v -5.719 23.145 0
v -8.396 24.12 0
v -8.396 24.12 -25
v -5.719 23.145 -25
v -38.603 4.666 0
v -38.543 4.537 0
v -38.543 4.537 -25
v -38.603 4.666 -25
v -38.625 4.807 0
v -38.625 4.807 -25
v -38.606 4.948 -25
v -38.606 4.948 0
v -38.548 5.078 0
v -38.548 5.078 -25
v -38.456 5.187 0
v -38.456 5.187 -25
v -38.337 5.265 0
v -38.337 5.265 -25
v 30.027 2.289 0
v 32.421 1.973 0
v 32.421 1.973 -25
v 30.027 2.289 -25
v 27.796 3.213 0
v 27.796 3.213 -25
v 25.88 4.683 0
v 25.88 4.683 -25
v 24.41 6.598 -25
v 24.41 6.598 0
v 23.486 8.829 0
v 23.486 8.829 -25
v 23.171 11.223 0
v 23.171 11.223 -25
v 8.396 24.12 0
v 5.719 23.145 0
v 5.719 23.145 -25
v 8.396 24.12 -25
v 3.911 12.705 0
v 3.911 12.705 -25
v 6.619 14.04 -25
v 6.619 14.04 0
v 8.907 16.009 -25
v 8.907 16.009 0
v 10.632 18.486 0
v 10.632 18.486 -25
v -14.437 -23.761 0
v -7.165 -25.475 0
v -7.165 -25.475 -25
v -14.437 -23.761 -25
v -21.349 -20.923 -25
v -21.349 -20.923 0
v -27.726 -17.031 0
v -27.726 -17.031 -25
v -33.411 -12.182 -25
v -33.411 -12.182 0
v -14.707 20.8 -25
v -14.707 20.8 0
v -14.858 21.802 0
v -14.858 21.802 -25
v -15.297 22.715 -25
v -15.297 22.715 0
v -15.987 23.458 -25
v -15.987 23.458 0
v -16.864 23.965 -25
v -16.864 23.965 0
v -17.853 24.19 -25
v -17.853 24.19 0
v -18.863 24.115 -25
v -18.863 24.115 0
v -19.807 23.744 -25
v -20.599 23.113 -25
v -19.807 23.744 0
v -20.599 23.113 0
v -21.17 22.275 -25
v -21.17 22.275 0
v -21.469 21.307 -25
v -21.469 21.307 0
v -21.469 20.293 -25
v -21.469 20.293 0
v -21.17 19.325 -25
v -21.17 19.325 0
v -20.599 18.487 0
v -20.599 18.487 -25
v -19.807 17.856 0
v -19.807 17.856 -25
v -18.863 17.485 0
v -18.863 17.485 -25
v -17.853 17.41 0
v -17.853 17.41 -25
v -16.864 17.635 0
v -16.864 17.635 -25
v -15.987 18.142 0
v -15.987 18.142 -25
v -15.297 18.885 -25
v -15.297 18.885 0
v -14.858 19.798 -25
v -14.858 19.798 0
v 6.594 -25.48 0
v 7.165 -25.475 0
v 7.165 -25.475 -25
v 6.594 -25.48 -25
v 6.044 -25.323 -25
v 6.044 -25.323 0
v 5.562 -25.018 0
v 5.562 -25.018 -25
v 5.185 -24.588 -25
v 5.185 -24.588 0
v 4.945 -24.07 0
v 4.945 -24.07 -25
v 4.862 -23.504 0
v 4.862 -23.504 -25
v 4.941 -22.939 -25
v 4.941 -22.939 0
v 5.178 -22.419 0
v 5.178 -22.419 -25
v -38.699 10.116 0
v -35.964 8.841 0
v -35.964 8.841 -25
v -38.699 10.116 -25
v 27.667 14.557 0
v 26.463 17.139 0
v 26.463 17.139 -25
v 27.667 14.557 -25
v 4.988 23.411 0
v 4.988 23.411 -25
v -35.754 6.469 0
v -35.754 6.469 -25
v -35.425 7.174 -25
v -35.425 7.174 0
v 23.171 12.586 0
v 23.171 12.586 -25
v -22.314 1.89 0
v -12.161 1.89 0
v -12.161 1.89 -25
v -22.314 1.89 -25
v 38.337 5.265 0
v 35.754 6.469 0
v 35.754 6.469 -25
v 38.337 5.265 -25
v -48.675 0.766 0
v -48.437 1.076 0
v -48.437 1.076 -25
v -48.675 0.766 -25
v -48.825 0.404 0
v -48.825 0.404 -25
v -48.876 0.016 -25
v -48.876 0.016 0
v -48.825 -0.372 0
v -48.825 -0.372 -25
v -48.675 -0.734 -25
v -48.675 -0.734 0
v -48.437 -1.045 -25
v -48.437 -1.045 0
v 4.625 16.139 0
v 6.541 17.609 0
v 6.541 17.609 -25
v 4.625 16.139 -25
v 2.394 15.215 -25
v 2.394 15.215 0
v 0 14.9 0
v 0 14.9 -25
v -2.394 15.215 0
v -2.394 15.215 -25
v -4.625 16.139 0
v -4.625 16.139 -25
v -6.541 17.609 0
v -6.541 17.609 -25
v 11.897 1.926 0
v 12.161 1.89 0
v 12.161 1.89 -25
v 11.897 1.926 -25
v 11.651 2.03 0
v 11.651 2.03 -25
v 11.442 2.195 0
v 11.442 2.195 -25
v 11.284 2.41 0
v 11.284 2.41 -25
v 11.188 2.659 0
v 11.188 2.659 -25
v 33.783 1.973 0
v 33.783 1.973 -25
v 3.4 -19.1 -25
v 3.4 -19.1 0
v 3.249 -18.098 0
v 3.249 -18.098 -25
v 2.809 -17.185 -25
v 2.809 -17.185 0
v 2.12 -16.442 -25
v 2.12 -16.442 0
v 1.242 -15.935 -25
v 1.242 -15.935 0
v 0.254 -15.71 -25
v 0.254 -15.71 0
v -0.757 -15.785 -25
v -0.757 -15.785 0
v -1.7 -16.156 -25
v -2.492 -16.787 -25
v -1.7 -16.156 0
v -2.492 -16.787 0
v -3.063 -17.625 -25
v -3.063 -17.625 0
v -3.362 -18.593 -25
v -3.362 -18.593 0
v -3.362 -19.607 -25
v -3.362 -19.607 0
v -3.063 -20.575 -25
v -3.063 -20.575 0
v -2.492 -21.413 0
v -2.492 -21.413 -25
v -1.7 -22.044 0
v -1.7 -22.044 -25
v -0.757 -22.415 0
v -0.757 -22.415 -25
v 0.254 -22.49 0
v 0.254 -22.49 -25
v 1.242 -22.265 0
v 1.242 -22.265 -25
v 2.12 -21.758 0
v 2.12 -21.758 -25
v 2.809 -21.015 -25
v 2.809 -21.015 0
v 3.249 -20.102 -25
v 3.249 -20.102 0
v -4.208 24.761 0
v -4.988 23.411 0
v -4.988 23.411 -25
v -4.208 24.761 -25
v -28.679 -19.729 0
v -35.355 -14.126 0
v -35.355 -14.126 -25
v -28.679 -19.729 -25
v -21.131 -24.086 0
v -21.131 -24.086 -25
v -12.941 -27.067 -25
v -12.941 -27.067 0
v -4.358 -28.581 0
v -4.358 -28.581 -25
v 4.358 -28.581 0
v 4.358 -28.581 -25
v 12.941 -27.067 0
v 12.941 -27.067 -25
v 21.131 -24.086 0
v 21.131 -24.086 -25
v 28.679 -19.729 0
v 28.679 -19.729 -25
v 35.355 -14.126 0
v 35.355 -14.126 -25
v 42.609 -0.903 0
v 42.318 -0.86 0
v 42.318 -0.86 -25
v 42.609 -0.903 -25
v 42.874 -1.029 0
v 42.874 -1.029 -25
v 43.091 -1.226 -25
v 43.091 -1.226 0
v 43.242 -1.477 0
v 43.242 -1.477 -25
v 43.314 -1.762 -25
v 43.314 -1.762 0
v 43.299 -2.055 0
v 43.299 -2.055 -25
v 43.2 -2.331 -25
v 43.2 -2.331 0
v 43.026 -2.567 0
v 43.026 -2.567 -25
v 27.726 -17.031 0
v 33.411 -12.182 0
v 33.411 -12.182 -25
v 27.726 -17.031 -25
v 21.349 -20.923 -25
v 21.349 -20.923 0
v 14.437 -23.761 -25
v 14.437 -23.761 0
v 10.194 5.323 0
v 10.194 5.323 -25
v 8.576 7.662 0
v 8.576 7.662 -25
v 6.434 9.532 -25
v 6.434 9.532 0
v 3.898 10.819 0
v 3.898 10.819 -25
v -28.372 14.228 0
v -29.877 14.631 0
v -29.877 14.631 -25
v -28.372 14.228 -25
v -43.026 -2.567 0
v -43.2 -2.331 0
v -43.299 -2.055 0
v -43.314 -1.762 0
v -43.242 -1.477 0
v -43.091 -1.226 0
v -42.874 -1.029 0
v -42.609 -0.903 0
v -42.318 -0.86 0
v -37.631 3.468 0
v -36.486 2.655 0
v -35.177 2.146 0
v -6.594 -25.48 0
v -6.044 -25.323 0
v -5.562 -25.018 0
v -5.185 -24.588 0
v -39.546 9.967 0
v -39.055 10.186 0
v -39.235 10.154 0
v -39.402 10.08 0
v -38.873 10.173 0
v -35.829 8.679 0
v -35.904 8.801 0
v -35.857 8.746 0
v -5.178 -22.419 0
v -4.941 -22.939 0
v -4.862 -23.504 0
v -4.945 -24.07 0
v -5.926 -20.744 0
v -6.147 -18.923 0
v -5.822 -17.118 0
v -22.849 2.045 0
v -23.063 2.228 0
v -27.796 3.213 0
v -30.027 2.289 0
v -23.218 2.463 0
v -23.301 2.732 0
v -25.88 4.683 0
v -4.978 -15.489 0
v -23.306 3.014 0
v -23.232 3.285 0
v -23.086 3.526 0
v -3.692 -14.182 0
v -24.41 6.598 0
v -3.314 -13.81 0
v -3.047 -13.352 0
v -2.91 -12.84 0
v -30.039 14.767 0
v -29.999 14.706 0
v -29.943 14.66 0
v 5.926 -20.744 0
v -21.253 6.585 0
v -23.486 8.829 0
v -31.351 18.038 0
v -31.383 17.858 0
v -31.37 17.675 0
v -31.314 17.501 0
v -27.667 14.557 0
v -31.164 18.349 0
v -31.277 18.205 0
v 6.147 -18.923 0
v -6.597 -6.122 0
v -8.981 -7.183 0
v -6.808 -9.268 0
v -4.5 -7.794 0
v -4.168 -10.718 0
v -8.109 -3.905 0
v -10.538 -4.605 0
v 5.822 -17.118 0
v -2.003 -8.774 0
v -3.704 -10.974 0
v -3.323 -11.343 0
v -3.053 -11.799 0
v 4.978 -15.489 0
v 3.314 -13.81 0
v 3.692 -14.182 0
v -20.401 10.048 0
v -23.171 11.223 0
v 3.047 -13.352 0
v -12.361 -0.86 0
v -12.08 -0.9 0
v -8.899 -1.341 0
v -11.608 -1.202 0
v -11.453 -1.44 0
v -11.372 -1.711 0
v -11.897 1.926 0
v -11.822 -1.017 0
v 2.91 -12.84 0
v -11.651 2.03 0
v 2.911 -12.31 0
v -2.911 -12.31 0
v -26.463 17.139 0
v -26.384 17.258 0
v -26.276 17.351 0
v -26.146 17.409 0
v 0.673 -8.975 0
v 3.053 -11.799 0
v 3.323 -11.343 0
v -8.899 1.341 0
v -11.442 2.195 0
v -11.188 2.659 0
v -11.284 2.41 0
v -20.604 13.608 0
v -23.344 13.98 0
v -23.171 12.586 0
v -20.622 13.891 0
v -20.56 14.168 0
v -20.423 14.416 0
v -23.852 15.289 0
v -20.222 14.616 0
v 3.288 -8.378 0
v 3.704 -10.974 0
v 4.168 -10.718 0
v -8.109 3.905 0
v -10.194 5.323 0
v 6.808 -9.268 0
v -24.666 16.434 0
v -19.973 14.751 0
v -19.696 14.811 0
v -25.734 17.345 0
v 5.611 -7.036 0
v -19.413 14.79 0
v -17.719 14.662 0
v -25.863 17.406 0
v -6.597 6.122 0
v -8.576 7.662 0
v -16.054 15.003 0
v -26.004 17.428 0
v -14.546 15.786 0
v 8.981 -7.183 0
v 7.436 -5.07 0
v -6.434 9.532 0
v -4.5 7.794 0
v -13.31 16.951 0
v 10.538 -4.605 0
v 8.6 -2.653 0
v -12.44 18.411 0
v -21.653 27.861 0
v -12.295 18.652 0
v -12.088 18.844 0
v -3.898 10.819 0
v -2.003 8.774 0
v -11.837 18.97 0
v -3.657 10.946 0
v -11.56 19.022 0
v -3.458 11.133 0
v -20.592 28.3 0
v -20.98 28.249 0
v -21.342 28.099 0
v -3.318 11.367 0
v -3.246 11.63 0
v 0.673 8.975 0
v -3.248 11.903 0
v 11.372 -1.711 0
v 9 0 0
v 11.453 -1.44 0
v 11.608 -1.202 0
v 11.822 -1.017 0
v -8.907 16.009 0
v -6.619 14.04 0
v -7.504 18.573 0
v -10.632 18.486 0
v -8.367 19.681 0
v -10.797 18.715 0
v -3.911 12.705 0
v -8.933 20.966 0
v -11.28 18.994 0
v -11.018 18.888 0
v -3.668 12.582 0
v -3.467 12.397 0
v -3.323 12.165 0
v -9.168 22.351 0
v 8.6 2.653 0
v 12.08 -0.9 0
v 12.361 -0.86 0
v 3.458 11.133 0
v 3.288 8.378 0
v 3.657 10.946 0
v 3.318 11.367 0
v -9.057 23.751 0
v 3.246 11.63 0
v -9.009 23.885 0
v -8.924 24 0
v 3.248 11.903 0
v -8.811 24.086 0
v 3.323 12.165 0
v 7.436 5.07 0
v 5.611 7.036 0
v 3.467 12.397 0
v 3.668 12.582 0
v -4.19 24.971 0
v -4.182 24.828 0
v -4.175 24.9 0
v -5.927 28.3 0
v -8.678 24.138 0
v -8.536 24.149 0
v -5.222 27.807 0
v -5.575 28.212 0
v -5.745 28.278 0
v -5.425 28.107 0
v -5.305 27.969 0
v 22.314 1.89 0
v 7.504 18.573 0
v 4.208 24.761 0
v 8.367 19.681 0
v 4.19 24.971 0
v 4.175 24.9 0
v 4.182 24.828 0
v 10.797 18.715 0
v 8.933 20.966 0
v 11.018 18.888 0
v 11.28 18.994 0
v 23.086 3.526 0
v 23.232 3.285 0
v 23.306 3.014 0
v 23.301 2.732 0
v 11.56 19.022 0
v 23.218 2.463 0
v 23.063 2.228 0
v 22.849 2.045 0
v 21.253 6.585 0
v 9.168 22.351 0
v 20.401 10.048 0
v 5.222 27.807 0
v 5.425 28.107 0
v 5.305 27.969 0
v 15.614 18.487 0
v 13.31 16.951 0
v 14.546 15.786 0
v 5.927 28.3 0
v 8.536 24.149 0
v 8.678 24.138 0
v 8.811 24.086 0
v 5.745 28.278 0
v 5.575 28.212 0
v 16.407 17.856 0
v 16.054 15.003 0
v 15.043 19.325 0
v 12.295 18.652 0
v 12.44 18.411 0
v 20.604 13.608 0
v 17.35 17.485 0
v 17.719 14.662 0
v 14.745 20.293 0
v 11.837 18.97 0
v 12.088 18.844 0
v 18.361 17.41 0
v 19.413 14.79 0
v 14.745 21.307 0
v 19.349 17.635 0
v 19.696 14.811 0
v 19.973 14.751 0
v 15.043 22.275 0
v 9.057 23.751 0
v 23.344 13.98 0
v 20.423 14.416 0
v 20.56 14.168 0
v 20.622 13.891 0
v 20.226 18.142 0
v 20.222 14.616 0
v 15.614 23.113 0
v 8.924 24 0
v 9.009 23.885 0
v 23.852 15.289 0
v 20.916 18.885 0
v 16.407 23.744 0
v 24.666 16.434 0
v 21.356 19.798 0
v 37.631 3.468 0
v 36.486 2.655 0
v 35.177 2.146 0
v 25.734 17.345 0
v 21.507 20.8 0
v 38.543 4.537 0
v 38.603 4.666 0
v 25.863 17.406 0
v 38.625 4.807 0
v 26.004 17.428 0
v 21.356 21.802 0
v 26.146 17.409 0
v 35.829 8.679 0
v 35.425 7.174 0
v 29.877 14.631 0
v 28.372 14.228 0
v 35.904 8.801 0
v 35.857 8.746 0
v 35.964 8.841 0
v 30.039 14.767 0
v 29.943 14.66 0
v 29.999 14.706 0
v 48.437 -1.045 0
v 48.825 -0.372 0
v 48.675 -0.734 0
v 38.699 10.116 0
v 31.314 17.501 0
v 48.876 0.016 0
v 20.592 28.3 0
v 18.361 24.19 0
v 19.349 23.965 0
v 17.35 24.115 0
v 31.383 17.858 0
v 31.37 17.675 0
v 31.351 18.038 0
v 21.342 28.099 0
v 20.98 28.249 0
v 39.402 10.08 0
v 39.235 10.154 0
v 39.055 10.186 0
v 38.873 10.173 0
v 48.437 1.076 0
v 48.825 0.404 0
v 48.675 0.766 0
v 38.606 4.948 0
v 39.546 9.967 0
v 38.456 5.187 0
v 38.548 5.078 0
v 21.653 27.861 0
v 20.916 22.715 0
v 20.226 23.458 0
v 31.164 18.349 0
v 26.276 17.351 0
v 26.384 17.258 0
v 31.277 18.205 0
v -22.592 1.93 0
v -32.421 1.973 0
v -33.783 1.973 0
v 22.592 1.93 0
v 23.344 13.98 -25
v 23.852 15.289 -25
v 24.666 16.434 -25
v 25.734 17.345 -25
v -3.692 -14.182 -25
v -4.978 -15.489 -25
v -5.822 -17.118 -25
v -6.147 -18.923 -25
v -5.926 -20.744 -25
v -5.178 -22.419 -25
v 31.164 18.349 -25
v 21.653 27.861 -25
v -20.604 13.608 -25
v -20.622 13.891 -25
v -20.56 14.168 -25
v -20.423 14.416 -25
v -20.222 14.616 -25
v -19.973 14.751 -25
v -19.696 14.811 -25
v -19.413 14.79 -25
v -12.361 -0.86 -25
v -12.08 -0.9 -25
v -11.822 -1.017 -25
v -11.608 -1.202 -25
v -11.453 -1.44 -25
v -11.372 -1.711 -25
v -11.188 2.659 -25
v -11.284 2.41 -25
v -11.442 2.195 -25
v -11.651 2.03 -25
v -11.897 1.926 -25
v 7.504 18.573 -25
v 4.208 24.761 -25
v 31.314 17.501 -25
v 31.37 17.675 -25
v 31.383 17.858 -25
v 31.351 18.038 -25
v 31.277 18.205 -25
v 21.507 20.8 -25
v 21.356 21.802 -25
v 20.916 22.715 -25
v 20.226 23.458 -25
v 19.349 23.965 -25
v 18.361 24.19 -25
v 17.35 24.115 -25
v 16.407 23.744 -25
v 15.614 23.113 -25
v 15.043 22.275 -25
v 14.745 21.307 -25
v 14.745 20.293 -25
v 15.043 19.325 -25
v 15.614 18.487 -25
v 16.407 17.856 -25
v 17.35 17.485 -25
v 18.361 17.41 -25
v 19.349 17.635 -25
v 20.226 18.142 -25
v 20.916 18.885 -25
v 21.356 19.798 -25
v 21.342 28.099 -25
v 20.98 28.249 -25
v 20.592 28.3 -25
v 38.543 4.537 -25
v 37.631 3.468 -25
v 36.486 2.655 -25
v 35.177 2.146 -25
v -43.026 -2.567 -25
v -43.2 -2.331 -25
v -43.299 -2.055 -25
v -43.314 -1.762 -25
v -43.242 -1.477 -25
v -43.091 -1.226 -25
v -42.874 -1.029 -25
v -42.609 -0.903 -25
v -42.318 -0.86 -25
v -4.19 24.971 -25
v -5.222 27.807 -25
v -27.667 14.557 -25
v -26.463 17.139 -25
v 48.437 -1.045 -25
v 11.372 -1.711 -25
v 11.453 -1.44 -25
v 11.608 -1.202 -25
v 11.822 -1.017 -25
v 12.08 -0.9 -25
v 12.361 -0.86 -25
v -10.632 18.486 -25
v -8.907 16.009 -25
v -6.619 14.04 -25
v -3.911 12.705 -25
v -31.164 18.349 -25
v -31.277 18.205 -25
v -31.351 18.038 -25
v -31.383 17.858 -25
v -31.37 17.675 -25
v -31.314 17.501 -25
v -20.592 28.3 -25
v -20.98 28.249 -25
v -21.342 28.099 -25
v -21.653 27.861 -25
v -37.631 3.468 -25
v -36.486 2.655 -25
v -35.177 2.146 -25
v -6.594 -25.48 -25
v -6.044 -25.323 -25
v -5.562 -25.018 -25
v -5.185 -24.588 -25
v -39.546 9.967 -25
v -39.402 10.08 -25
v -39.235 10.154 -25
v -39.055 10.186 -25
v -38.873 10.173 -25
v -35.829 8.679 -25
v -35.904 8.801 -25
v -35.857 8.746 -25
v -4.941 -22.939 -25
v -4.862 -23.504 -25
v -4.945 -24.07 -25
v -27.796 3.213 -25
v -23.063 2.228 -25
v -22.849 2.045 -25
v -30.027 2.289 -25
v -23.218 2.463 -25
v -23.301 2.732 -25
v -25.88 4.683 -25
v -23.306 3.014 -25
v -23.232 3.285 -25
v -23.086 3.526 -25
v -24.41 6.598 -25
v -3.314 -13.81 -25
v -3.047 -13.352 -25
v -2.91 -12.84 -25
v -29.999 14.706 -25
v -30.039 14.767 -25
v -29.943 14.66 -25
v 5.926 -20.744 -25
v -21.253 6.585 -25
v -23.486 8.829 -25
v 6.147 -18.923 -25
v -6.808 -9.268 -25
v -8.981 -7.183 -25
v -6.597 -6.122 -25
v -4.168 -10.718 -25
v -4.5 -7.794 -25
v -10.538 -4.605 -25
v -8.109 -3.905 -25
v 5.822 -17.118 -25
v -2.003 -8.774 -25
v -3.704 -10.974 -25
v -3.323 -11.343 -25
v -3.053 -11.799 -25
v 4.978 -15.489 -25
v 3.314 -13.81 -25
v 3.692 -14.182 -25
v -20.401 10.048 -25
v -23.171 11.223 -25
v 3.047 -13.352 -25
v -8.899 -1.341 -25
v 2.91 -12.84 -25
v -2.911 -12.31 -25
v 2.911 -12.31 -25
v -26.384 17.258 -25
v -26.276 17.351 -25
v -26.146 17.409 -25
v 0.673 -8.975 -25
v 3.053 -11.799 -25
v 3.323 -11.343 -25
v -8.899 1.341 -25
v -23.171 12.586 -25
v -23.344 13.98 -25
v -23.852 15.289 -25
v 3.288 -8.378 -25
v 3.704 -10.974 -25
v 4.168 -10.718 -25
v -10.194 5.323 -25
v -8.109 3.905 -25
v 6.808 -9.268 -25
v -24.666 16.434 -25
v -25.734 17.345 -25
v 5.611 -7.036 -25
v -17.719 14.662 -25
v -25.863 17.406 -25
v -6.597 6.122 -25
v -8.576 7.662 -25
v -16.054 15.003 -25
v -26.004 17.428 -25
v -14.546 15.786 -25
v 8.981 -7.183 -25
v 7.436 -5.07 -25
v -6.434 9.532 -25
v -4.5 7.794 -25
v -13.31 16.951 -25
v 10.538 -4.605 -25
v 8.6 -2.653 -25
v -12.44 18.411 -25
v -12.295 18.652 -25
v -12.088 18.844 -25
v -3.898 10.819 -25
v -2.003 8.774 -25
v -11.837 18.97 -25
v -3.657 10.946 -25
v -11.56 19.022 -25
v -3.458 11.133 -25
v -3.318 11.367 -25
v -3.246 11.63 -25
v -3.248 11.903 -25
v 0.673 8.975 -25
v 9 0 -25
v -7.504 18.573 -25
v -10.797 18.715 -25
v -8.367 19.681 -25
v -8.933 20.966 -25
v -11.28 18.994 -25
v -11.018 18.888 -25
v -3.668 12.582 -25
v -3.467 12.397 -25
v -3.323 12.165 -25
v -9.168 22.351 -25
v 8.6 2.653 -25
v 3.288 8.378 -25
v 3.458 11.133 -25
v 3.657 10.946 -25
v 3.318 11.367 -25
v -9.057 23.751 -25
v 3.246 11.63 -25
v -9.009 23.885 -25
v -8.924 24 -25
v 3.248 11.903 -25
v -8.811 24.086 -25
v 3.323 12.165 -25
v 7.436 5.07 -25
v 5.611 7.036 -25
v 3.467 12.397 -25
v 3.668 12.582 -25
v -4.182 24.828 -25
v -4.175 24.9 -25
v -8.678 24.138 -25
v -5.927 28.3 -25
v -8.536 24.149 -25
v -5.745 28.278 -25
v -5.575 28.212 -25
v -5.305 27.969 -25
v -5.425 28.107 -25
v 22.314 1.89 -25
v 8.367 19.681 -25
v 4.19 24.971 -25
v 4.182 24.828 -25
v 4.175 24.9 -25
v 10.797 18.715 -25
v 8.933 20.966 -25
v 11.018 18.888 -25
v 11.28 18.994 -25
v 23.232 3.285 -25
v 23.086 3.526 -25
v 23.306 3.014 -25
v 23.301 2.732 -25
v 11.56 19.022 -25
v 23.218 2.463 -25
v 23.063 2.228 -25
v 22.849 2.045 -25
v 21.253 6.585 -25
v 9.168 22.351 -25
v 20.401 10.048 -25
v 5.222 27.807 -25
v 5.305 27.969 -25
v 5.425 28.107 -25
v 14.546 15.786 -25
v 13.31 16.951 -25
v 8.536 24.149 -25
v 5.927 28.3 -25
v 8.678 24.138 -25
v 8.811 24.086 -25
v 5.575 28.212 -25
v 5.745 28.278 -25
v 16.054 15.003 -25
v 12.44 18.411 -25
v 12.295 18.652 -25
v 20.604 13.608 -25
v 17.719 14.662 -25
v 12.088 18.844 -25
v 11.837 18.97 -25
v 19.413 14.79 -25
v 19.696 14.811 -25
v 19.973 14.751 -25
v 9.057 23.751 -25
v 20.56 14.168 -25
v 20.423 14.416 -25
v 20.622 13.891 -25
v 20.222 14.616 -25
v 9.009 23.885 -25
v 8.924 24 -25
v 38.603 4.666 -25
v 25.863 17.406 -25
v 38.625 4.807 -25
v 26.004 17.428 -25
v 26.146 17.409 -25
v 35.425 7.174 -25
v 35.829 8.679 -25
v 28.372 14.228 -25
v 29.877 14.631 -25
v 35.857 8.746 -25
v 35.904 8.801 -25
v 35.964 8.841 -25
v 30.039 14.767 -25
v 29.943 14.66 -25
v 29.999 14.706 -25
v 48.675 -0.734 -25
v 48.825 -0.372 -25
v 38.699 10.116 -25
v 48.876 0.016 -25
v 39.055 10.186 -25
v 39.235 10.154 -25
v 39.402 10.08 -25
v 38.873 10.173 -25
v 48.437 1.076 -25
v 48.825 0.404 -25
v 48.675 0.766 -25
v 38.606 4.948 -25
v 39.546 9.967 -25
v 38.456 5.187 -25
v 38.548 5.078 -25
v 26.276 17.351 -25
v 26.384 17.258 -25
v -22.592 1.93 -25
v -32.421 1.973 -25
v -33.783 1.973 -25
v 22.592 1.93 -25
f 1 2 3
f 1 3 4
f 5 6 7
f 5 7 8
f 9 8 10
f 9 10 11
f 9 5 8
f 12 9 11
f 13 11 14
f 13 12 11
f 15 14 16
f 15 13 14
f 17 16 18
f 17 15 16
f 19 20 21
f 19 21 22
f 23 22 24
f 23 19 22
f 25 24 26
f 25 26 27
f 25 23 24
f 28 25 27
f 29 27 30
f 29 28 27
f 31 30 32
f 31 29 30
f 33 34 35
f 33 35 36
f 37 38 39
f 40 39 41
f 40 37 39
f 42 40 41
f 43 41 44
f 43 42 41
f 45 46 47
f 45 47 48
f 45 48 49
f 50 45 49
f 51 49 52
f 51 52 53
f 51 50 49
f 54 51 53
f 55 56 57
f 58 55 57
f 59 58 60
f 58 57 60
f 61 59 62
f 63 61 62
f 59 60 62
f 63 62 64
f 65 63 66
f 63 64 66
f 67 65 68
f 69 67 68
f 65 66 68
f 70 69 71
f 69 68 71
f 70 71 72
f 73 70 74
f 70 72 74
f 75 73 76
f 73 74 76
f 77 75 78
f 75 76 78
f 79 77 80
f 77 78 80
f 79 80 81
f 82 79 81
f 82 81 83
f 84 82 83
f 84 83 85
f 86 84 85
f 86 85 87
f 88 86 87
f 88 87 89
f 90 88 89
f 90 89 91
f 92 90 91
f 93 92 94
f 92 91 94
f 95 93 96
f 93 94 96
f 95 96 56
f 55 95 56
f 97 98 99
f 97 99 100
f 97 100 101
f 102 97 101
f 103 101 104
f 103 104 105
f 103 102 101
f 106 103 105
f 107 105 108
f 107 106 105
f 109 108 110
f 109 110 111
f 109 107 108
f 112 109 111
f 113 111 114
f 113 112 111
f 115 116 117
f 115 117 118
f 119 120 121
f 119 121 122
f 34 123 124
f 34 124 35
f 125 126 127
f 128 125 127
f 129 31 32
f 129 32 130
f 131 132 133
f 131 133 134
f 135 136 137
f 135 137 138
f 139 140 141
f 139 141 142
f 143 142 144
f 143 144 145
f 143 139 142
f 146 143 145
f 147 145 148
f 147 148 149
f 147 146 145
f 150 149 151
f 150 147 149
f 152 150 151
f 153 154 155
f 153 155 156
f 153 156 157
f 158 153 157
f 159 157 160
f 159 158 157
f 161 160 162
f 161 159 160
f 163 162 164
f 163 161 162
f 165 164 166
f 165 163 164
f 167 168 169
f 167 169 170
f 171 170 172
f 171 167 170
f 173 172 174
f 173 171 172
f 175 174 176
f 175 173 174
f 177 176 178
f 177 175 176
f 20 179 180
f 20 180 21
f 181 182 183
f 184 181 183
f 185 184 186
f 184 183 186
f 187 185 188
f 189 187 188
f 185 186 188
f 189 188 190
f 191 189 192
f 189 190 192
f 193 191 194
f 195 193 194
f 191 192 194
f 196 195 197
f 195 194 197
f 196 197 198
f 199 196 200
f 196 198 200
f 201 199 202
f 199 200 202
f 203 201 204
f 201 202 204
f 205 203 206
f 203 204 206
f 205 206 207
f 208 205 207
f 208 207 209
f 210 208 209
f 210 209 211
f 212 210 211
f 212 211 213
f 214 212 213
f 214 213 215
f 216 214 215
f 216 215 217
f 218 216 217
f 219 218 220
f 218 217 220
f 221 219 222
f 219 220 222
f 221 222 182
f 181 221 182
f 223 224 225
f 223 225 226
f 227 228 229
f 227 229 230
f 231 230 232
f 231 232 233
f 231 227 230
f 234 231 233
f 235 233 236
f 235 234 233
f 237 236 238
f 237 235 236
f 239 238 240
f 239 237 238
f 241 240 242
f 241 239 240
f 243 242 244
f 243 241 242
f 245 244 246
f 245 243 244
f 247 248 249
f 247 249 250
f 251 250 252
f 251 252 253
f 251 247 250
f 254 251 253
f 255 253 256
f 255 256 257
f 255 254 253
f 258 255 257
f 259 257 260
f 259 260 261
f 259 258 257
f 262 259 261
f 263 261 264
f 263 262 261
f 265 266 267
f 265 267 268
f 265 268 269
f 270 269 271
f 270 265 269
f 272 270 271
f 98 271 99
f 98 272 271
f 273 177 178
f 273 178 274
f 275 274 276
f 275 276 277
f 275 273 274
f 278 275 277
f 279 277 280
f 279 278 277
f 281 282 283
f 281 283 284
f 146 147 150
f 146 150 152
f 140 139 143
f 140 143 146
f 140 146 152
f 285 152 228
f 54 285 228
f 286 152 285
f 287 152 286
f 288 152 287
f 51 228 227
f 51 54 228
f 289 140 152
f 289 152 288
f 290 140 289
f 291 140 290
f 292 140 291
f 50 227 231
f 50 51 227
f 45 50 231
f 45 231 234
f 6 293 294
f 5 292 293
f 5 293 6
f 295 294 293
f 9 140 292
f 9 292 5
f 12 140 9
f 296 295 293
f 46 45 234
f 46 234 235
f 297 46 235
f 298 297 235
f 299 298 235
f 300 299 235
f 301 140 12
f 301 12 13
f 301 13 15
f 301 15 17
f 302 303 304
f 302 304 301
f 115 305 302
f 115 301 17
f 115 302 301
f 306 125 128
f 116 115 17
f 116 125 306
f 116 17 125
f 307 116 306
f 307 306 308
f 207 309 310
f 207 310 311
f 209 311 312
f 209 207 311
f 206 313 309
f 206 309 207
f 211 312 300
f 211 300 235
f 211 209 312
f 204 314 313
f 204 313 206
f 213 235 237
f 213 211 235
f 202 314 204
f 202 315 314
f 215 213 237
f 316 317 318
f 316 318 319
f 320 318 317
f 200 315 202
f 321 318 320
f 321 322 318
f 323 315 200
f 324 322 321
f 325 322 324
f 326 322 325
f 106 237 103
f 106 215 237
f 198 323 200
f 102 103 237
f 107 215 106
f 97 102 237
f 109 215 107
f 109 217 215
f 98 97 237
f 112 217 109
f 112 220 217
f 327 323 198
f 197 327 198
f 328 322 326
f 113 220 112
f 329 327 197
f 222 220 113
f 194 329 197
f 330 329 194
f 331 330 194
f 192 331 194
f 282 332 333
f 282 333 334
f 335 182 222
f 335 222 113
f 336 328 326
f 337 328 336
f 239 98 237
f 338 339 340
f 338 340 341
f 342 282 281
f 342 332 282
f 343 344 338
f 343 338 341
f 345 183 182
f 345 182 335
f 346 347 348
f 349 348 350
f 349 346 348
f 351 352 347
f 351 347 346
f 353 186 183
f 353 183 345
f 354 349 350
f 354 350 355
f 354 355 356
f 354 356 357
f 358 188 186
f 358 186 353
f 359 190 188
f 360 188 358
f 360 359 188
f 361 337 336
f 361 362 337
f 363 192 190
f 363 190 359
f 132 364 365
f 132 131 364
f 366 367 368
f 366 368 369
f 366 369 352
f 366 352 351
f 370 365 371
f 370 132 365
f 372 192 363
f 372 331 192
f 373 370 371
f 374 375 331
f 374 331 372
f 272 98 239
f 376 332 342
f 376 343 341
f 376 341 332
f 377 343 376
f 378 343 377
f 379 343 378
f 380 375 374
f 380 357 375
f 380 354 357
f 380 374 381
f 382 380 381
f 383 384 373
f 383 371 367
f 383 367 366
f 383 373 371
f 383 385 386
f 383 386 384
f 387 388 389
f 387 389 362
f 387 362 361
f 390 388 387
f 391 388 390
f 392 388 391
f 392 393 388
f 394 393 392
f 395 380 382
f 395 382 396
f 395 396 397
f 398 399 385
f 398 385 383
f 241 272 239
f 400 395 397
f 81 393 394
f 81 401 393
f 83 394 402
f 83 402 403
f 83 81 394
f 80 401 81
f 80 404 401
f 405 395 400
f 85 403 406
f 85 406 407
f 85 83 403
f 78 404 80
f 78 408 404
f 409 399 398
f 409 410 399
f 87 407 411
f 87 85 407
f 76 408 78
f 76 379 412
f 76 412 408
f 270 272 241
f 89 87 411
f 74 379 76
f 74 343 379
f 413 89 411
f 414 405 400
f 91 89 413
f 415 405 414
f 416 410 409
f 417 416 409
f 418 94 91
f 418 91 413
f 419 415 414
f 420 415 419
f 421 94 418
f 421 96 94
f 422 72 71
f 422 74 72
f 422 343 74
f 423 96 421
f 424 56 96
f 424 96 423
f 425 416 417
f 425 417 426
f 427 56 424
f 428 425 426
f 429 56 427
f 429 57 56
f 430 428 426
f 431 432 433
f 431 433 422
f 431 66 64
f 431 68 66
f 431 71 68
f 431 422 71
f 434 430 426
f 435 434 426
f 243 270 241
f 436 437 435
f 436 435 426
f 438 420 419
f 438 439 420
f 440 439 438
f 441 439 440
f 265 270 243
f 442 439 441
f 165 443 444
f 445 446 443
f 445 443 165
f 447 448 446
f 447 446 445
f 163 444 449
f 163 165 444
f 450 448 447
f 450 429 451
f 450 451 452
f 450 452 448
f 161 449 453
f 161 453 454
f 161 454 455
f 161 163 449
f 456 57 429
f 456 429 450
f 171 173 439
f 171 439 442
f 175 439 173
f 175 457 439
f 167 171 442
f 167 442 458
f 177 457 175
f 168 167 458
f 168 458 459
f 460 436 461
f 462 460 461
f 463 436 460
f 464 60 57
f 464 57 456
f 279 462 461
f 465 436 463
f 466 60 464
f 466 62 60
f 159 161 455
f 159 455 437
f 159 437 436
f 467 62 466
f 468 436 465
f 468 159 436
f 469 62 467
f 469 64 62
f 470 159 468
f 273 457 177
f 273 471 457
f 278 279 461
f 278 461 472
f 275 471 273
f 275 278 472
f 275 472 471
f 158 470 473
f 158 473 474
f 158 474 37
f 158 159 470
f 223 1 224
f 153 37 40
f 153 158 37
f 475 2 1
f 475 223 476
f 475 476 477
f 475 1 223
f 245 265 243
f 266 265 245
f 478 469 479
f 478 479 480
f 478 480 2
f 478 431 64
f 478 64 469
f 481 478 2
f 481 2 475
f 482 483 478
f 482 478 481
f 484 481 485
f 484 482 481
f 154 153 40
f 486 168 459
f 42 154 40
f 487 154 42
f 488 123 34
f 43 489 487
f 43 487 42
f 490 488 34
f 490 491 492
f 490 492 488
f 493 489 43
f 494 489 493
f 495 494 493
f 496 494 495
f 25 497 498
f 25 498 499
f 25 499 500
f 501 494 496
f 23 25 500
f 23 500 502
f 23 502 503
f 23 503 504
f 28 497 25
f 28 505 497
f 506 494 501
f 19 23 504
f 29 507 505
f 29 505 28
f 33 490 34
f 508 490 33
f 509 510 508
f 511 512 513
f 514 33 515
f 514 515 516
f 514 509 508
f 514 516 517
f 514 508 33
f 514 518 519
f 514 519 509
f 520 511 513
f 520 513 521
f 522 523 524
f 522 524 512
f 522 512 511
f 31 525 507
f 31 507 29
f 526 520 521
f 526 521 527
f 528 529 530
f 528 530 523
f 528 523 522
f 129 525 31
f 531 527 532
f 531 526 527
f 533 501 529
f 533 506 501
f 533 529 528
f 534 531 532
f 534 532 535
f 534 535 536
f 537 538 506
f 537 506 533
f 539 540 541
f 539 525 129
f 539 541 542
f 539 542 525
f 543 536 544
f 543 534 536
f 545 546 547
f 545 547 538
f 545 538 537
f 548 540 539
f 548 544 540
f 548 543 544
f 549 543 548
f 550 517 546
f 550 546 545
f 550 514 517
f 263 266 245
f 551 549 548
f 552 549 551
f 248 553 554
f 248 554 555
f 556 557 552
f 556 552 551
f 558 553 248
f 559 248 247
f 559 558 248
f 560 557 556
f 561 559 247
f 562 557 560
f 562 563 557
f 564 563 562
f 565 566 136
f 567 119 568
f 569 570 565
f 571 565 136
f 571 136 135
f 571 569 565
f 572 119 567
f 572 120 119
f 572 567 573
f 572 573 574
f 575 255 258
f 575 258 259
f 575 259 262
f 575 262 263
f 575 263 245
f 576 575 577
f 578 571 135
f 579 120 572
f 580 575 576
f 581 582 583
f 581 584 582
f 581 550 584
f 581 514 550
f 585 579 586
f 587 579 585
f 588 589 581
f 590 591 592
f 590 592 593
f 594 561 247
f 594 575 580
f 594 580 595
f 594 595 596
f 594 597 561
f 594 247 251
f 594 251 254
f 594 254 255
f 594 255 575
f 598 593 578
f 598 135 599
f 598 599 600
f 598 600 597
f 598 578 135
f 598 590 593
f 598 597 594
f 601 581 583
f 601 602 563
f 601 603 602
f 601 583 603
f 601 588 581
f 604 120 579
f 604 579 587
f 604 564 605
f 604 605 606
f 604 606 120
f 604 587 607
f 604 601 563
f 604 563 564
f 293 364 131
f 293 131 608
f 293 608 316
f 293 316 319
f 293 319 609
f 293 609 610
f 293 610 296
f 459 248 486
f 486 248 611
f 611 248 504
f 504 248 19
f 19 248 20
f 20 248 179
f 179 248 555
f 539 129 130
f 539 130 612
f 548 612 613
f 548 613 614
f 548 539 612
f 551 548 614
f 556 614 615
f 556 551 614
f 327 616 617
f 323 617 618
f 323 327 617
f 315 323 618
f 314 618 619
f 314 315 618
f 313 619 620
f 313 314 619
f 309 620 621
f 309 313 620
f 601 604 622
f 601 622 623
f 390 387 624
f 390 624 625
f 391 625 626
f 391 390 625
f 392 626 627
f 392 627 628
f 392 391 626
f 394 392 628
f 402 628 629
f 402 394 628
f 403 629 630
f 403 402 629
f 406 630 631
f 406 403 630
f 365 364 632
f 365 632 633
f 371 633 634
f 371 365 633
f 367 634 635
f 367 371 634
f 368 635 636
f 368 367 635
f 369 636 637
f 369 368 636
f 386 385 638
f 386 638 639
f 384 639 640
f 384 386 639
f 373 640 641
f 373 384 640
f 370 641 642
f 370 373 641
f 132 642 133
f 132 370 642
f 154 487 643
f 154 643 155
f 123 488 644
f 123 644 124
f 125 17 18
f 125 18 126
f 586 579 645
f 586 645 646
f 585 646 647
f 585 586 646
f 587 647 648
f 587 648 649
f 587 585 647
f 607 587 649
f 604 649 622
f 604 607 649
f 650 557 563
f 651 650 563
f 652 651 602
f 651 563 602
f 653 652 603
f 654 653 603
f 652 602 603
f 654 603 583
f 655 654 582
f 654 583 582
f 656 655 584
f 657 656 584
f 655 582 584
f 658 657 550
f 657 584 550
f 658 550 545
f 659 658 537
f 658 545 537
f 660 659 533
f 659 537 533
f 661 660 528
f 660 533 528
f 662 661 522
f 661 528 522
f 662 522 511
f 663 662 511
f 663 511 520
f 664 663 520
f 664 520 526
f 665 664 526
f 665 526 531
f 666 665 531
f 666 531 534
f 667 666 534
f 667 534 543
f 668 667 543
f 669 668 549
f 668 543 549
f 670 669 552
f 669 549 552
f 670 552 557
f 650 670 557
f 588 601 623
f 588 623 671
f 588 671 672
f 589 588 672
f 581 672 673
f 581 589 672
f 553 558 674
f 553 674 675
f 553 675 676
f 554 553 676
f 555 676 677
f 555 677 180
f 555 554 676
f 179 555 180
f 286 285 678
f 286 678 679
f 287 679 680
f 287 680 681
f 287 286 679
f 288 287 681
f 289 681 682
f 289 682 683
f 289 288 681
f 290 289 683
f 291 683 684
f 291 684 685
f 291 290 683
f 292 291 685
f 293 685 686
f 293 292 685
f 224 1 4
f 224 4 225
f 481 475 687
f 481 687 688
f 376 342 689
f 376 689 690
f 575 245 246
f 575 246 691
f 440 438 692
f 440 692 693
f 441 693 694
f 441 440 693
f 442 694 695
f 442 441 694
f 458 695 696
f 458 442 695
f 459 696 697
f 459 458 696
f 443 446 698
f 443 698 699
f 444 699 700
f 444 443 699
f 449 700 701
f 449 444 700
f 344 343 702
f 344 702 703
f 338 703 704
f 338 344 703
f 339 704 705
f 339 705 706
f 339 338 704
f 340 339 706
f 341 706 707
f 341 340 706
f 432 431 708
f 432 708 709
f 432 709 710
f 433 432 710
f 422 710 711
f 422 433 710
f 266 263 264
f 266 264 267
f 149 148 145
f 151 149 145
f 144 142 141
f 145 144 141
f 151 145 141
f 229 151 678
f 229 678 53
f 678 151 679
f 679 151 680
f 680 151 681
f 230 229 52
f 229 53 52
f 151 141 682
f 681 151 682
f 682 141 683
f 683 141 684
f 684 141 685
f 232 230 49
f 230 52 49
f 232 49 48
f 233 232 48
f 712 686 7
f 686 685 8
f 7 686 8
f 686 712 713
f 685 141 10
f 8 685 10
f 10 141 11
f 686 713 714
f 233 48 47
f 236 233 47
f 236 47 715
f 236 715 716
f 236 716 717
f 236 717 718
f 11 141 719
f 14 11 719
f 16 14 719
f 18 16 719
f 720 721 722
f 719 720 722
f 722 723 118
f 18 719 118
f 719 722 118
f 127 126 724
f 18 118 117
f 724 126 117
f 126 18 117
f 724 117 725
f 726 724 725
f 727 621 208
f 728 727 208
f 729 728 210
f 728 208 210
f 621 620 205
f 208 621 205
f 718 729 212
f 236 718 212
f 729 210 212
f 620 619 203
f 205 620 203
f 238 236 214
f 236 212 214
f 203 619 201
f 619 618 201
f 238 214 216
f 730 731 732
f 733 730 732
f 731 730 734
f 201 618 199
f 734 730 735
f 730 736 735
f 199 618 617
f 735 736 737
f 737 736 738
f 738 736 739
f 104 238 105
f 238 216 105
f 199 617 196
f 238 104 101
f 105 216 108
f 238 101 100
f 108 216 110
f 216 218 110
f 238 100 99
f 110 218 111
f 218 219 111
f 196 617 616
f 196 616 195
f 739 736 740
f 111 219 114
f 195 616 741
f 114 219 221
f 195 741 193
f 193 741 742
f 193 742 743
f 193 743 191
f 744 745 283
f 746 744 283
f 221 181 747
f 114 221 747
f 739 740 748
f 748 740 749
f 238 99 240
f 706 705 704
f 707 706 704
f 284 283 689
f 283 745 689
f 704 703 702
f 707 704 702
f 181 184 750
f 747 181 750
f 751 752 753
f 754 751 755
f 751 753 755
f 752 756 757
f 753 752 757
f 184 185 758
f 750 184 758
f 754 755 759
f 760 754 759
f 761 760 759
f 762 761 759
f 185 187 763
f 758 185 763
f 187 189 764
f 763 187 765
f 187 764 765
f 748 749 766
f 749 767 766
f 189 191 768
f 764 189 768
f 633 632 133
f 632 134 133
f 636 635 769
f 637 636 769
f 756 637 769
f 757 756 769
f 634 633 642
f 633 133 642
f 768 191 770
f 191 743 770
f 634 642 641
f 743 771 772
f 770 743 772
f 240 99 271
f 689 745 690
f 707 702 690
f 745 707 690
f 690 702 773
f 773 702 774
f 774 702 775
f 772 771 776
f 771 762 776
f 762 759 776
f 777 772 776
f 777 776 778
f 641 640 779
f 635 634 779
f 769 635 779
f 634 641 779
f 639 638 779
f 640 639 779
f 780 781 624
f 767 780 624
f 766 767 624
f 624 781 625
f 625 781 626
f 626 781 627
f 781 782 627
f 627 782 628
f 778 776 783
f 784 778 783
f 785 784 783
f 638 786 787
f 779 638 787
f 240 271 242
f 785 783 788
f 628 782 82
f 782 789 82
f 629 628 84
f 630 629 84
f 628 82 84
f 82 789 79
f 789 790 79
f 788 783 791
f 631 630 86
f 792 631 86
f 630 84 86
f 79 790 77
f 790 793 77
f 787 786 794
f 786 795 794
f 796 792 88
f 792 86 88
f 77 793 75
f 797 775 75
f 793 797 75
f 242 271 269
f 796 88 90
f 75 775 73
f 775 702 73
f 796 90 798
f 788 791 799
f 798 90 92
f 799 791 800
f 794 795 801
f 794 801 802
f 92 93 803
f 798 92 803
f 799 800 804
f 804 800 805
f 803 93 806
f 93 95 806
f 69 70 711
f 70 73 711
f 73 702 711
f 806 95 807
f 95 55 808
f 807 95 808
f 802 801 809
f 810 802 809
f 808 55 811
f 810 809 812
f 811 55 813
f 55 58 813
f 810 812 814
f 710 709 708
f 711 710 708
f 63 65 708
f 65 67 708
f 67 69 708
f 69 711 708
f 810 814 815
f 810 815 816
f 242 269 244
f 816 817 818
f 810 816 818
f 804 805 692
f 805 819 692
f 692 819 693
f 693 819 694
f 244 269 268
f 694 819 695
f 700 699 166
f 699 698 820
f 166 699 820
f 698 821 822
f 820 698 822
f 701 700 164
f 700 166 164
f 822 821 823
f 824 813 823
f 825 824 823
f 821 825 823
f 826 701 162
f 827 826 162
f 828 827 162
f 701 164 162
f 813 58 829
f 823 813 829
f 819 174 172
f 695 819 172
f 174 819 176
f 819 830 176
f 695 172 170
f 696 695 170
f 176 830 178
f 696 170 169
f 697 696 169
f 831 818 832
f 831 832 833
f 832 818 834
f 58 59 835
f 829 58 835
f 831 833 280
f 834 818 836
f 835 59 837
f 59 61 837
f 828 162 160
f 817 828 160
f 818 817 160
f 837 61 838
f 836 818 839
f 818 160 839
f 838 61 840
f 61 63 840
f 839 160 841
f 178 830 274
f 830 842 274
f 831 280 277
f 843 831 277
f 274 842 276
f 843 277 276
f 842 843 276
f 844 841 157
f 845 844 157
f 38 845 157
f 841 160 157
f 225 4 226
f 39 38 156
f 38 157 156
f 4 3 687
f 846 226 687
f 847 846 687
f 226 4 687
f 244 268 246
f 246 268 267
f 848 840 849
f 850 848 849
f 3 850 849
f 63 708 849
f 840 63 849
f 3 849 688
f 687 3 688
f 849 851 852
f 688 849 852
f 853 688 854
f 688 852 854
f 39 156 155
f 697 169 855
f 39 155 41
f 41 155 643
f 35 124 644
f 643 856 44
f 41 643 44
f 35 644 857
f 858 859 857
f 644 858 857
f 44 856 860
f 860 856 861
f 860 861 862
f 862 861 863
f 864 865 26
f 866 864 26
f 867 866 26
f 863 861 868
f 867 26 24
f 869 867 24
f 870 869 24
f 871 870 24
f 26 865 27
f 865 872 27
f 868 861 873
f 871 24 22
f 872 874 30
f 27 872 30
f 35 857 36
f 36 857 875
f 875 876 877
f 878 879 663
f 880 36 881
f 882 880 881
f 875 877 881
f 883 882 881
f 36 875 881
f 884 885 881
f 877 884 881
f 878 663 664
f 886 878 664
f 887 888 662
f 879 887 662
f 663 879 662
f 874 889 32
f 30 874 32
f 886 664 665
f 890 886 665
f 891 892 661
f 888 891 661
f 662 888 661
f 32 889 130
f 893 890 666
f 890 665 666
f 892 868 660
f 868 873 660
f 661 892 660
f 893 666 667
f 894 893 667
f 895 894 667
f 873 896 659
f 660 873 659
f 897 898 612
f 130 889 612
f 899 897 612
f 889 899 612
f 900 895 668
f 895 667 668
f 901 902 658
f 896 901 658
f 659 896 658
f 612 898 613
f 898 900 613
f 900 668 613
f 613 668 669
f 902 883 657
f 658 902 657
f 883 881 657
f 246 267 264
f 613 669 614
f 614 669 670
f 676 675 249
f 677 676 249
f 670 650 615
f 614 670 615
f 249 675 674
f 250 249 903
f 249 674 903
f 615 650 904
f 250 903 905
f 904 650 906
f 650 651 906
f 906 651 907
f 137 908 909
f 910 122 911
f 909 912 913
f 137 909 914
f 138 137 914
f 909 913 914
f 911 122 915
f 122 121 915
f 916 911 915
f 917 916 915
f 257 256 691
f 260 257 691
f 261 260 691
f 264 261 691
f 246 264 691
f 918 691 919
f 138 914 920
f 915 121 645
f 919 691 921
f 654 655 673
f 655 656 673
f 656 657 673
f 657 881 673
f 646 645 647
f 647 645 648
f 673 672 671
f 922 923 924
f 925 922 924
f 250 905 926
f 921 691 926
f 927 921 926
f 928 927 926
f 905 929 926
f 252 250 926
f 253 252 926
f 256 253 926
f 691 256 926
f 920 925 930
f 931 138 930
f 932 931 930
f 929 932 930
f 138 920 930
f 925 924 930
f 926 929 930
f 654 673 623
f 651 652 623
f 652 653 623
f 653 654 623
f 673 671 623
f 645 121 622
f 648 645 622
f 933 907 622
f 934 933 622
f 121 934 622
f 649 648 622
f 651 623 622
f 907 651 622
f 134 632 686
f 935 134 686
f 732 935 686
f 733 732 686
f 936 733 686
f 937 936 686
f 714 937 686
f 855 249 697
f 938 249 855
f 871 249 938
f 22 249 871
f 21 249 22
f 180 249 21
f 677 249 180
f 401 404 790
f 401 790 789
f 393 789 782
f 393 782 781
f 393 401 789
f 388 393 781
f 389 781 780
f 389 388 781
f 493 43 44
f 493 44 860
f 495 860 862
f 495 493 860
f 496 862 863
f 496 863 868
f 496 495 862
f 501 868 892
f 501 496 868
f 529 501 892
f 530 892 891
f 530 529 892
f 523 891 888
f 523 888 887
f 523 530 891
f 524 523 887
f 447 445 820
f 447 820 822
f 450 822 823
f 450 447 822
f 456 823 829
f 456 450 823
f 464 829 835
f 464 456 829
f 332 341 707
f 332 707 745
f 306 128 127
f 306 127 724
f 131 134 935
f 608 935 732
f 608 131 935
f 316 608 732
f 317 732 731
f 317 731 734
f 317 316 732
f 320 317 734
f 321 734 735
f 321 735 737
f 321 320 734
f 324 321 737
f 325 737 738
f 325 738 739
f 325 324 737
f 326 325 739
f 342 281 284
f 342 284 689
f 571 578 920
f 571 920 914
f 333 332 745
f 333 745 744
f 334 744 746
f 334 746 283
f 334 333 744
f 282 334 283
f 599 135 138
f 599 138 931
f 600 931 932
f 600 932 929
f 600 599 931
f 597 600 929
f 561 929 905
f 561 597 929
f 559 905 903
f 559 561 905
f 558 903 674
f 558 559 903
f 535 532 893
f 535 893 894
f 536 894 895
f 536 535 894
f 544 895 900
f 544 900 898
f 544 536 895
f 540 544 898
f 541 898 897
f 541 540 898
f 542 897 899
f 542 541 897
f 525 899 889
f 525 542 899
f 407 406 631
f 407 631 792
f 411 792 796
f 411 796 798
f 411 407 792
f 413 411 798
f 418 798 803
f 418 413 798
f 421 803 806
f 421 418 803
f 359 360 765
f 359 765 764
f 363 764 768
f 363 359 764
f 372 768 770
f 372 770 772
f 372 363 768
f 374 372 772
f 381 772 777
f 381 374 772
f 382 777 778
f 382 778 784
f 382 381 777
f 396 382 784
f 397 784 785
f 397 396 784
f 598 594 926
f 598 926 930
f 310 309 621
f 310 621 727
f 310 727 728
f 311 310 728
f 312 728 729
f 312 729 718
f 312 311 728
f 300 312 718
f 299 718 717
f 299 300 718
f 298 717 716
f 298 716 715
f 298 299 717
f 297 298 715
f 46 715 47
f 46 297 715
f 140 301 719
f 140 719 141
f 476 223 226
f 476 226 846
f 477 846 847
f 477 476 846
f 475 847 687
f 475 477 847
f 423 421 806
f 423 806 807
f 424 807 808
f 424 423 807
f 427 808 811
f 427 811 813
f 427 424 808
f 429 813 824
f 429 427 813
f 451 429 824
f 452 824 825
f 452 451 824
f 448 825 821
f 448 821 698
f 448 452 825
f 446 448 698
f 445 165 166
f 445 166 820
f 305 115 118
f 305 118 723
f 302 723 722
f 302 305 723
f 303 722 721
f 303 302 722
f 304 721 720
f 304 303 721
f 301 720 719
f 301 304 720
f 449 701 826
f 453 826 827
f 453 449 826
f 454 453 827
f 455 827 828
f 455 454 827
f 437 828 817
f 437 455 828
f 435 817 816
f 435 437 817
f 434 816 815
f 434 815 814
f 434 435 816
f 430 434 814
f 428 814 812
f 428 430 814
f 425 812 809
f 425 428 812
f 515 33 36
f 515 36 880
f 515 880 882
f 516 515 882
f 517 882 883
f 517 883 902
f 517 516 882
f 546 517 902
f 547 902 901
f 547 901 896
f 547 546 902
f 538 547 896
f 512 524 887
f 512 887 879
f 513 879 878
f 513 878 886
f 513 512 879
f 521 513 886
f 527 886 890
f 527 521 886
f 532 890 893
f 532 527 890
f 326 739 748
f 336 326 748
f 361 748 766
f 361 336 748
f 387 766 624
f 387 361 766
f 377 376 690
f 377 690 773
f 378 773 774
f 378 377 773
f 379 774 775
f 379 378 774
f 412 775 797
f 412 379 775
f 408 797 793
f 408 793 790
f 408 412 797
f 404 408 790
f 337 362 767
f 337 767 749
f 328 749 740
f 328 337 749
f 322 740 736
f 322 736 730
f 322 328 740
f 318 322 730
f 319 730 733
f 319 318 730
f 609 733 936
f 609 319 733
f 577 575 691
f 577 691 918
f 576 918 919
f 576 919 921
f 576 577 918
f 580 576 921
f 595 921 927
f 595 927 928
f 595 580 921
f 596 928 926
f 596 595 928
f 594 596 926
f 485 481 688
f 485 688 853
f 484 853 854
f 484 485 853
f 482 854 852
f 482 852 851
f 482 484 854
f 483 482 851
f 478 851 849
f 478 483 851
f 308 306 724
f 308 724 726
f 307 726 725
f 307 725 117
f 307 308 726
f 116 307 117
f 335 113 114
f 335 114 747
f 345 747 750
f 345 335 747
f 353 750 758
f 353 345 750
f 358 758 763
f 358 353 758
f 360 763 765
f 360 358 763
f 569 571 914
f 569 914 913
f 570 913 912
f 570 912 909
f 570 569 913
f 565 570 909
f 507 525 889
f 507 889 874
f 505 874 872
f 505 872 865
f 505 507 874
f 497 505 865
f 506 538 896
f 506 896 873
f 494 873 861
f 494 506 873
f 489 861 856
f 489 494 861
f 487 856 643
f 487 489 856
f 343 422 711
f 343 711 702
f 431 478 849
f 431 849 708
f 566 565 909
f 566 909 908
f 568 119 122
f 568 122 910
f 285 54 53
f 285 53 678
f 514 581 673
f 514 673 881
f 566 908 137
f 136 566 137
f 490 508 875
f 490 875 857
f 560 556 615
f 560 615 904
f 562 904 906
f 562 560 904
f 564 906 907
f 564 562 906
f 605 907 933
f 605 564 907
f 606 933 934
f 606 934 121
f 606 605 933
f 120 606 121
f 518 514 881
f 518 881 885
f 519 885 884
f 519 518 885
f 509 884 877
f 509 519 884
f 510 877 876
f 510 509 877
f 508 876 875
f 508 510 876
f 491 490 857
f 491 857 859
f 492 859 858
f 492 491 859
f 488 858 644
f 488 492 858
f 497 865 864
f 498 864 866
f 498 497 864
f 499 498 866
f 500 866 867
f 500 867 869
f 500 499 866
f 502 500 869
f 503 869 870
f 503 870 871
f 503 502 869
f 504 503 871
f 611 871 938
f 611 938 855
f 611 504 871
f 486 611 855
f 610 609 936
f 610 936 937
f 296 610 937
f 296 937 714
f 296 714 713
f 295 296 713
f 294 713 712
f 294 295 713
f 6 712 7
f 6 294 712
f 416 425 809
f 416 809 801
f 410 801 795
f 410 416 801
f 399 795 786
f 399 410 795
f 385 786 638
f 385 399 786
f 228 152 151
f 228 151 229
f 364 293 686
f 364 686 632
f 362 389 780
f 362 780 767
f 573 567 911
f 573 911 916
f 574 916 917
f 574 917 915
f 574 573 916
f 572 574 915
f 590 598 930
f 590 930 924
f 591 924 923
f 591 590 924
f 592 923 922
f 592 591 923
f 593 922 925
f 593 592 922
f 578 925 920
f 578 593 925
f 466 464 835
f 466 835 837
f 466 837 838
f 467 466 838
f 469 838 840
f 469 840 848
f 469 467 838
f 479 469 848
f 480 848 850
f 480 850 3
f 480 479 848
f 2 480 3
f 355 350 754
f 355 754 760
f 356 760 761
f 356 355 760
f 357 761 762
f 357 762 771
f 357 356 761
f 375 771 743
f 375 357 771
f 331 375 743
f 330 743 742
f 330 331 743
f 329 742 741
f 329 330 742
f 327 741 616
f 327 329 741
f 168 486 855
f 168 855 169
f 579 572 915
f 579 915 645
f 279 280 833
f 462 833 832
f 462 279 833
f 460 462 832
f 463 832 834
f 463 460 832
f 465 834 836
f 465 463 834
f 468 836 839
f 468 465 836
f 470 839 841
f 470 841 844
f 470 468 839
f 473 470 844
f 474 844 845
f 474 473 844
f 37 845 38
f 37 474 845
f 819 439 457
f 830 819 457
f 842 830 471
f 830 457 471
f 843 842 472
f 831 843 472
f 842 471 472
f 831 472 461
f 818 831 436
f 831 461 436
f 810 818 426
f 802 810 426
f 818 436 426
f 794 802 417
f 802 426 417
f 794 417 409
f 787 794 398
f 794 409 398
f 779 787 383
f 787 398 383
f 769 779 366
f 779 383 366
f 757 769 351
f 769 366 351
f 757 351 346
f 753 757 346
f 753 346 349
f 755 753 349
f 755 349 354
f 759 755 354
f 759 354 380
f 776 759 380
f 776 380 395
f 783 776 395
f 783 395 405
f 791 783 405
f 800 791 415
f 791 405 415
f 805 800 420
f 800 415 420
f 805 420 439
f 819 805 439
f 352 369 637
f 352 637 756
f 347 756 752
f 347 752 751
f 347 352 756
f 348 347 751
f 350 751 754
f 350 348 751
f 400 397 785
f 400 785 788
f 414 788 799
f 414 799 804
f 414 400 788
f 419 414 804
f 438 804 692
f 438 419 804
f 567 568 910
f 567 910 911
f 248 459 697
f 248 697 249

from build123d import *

# Parameters (mm, degrees)
SK_MAIN_EXTRUSION_R   = 3.4
SK_MAIN_EXTRUSION_R_2 = 9
MAIN_EXTRUSION_DEPTH  = 25


with BuildPart() as part:
    # Sk Main Extrusion → Main Extrusion (new body)
    with BuildSketch(Plane.XY):
        with BuildLine():
            Line((-35.964339765, 8.84120158), (-38.698942589, 10.116367819))
            ThreePointArc((-38.698942589, 10.116367819), (-39.146142418, 10.175242794), (-39.546236371, 9.966967065))
            Line((-39.546236371, 9.966967065), (-48.436814511, 1.076388924))
            ThreePointArc((-48.436814511, 1.076388924), (-48.876154339, 0.015728753), (-48.436814511, -1.044931419))
            Line((-48.436814511, -1.044931419), (-35.355339059, -14.126406871))
            ThreePointArc((-35.355339059, -14.126406871), (0, -28.771067812), (35.355339059, -14.126406871))
            Line((35.355339059, -14.126406871), (48.436814511, -1.044931419))
            ThreePointArc((48.436814511, -1.044931419), (48.876154339, 0.015728753), (48.436814511, 1.076388924))
            Line((48.436814511, 1.076388924), (39.546236371, 9.966967065))
            ThreePointArc((39.546236371, 9.966967065), (39.146142418, 10.175242794), (38.698942589, 10.116367819))
            Line((38.698942589, 10.116367819), (35.964339765, 8.84120158))
            ThreePointArc((35.964339765, 8.84120158), (35.87848322, 8.775321536), (35.828512874, 8.679329395))
            Line((35.828512874, 8.679329395), (35.425239457, 7.174292513))
            Line((35.425239457, 7.174292513), (35.753978107, 6.469310204))
            Line((35.753978107, 6.469310204), (38.336524222, 5.265049173))
            ThreePointArc((38.336524222, 5.265049173), (38.606308031, 4.948092133), (38.542703923, 4.53675336))
            ThreePointArc((38.542703923, 4.53675336), (36.486225813, 2.654969004), (33.783331243, 1.973371234))
            Line((33.783331243, 1.973371234), (32.420845917, 1.973371234))
            ThreePointArc((32.420845917, 1.973371234), (25.880108191, 4.682633508), (23.170845917, 11.223371234))
            Line((23.170845917, 11.223371234), (23.170845917, 12.585856559))
            ThreePointArc((23.170845917, 12.585856559), (23.852443688, 15.28875113), (25.734228043, 17.34522924))
            ThreePointArc((25.734228043, 17.34522924), (26.145566816, 17.408833348), (26.462523856, 17.139049539))
            Line((26.462523856, 17.139049539), (27.666784887, 14.556503424))
            Line((27.666784887, 14.556503424), (28.371767196, 14.227764774))
            Line((28.371767196, 14.227764774), (29.876804078, 14.631038191))
            ThreePointArc((29.876804078, 14.631038191), (29.972796219, 14.681008536), (30.038676264, 14.766865082))
            Line((30.038676264, 14.766865082), (31.313842502, 17.501467906))
            ThreePointArc((31.313842502, 17.501467906), (31.372717477, 17.948667735), (31.164441748, 18.348761688))
            Line((31.164441748, 18.348761688), (21.652543264, 27.860660172))
            ThreePointArc((21.652543264, 27.860660172), (21.165908241, 28.185819299), (20.591883092, 28.3))
            Line((20.591883092, 28.3), (5.926823816, 28.3))
            ThreePointArc((5.926823816, 28.3), (5.496641489, 28.164364033), (5.222054351, 27.806515107))
            Line((5.222054351, 27.806515107), (4.190076845, 24.971180212))
            ThreePointArc((4.190076845, 24.971180212), (4.175951325, 24.863886241), (4.208493649, 24.760675177))
            Line((4.208493649, 24.760675177), (4.987558066, 23.411296024))
            Line((4.987558066, 23.411296024), (5.718509166, 23.145251581))
            Line((5.718509166, 23.145251581), (8.396186179, 24.11984631))
            ThreePointArc((8.396186179, 24.11984631), (8.811074612, 24.086489799), (9.056960151, 23.750654467))
            ThreePointArc((9.056960151, 23.750654467), (8.933433013, 20.965882372), (7.504160339, 18.572684887))
            Line((7.504160339, 18.572684887), (6.540737726, 17.609262274))
            ThreePointArc((6.540737726, 17.609262274), (0, 14.9), (-6.540737726, 17.609262274))
            Line((-6.540737726, 17.609262274), (-7.504160339, 18.572684887))
            ThreePointArc((-7.504160339, 18.572684887), (-8.933433013, 20.965882372), (-9.056960151, 23.750654467))
            ThreePointArc((-9.056960151, 23.750654467), (-8.811074612, 24.086489799), (-8.396186179, 24.11984631))
            Line((-8.396186179, 24.11984631), (-5.718509166, 23.145251581))
            Line((-5.718509166, 23.145251581), (-4.987558066, 23.411296024))
            Line((-4.987558066, 23.411296024), (-4.208493649, 24.760675177))
            ThreePointArc((-4.208493649, 24.760675177), (-4.175951325, 24.863886241), (-4.190076845, 24.971180212))
            Line((-4.190076845, 24.971180212), (-5.222054351, 27.806515107))
            ThreePointArc((-5.222054351, 27.806515107), (-5.496641489, 28.164364033), (-5.926823816, 28.3))
            Line((-5.926823816, 28.3), (-20.591883092, 28.3))
            ThreePointArc((-20.591883092, 28.3), (-21.165908241, 28.185819299), (-21.652543264, 27.860660172))
            Line((-21.652543264, 27.860660172), (-31.164441748, 18.348761688))
            ThreePointArc((-31.164441748, 18.348761688), (-31.372717477, 17.948667735), (-31.313842502, 17.501467906))
            Line((-31.313842502, 17.501467906), (-30.038676264, 14.766865082))
            ThreePointArc((-30.038676264, 14.766865082), (-29.972796219, 14.681008536), (-29.876804078, 14.631038191))
            Line((-29.876804078, 14.631038191), (-28.371767196, 14.227764774))
            Line((-28.371767196, 14.227764774), (-27.666784887, 14.556503424))
            Line((-27.666784887, 14.556503424), (-26.462523856, 17.139049539))
            ThreePointArc((-26.462523856, 17.139049539), (-26.145566816, 17.408833348), (-25.734228043, 17.34522924))
            ThreePointArc((-25.734228043, 17.34522924), (-23.852443688, 15.28875113), (-23.170845917, 12.585856559))
            Line((-23.170845917, 12.585856559), (-23.170845917, 11.223371234))
            ThreePointArc((-23.170845917, 11.223371234), (-25.880108191, 4.682633508), (-32.420845917, 1.973371234))
            Line((-32.420845917, 1.973371234), (-33.783331243, 1.973371234))
            ThreePointArc((-33.783331243, 1.973371234), (-36.486225813, 2.654969004), (-38.542703923, 4.53675336))
            ThreePointArc((-38.542703923, 4.53675336), (-38.606308031, 4.948092133), (-38.336524222, 5.265049173))
            Line((-38.336524222, 5.265049173), (-35.753978107, 6.469310204))
            Line((-35.753978107, 6.469310204), (-35.425239457, 7.174292513))
            Line((-35.425239457, 7.174292513), (-35.828512874, 8.679329395))
            ThreePointArc((-35.828512874, 8.679329395), (-35.87848322, 8.775321536), (-35.964339765, 8.84120158))
        make_face()
        with Locations((0, -19.1)):
            Circle(SK_MAIN_EXTRUSION_R, mode=Mode.SUBTRACT)
        Circle(SK_MAIN_EXTRUSION_R_2, mode=Mode.SUBTRACT)
        with Locations((18.106601718, 20.8)):
            Circle(SK_MAIN_EXTRUSION_R, mode=Mode.SUBTRACT)
        with Locations((-18.106601718, 20.8)):
            Circle(SK_MAIN_EXTRUSION_R, mode=Mode.SUBTRACT)
        with BuildLine():
            Line((-33.410795411, -12.181863223), (-43.025551853, -2.567106781))
            ThreePointArc((-43.025551853, -2.567106781), (-43.242324604, -1.477316568), (-42.318445072, -0.86))
            Line((-42.318445072, -0.86), (-12.360841395, -0.86))
            ThreePointArc((-12.360841395, -0.86), (-11.708461138, -1.102108187), (-11.371974084, -1.7112))
            ThreePointArc((-11.371974084, -1.7112), (-8.980737669, -7.183059997), (-4.167977698, -10.718113729))
            ThreePointArc((-4.167977698, -10.718113729), (-2.911454942, -12.309920658), (-3.692145622, -14.181609948))
            ThreePointArc((-3.692145622, -14.181609948), (-6.052344462, -18.008383533), (-5.177787873, -22.418585955))
            ThreePointArc((-5.177787873, -22.418585955), (-5.184897798, -24.588029411), (-7.164897408, -25.474673081))
            ThreePointArc((-7.164897408, -25.474673081), (-21.348803489, -20.923067641), (-33.410795411, -12.181863223))
        make_face(mode=Mode.SUBTRACT)
        with BuildLine():
            Line((43.025551853, -2.567106781), (33.410795411, -12.181863223))
            ThreePointArc((33.410795411, -12.181863223), (21.348803489, -20.923067641), (7.164897408, -25.474673081))
            ThreePointArc((7.164897408, -25.474673081), (5.184897798, -24.588029411), (5.177787873, -22.418585955))
            ThreePointArc((5.177787873, -22.418585955), (6.052344462, -18.008383533), (3.692145622, -14.181609948))
            ThreePointArc((3.692145622, -14.181609948), (2.911454942, -12.309920658), (4.167977698, -10.718113729))
            ThreePointArc((4.167977698, -10.718113729), (8.980737669, -7.183059997), (11.371974084, -1.7112))
            ThreePointArc((11.371974084, -1.7112), (11.708461138, -1.102108187), (12.360841395, -0.86))
            Line((12.360841395, -0.86), (42.318445072, -0.86))
            ThreePointArc((42.318445072, -0.86), (43.242324604, -1.477316568), (43.025551853, -2.567106781))
        make_face(mode=Mode.SUBTRACT)
        with BuildLine():
            Line((22.313779306, 1.89), (12.161328052, 1.89))
            ThreePointArc((12.161328052, 1.89), (11.541328052, 2.10539819), (11.188421808, 2.6588))
            ThreePointArc((11.188421808, 2.6588), (8.576111126, 7.661613273), (3.898250872, 10.819133058))
            ThreePointArc((3.898250872, 10.819133058), (3.237253097, 11.766839243), (3.911288501, 12.70531745))
            ThreePointArc((3.911288501, 12.70531745), (7.825101881, 14.952320052), (10.632154811, 18.486072973))
            ThreePointArc((10.632154811, 18.486072973), (11.559727768, 19.021547306), (12.439624063, 18.410886302))
            ThreePointArc((12.439624063, 18.410886302), (15.272696143, 15.341842876), (19.412884455, 14.790330674))
            ThreePointArc((19.412884455, 14.790330674), (20.329585798, 14.523052251), (20.604120456, 13.608497808))
            ThreePointArc((20.604120456, 13.608497808), (20.697886834, 8.284715824), (23.085806686, 3.525589274))
            ThreePointArc((23.085806686, 3.525589274), (23.218099292, 2.463144798), (22.313779306, 1.89))
        make_face(mode=Mode.SUBTRACT)
        with BuildLine():
            Line((-12.161328052, 1.89), (-22.313779306, 1.89))
            ThreePointArc((-22.313779306, 1.89), (-23.218099292, 2.463144798), (-23.085806686, 3.525589274))
            ThreePointArc((-23.085806686, 3.525589274), (-20.697886834, 8.284715824), (-20.604120456, 13.608497808))
            ThreePointArc((-20.604120456, 13.608497808), (-20.329585798, 14.523052251), (-19.412884455, 14.790330674))
            ThreePointArc((-19.412884455, 14.790330674), (-15.272696143, 15.341842876), (-12.439624063, 18.410886302))
            ThreePointArc((-12.439624063, 18.410886302), (-11.559727768, 19.021547306), (-10.632154811, 18.486072973))
            ThreePointArc((-10.632154811, 18.486072973), (-7.825101881, 14.952320052), (-3.911288501, 12.70531745))
            ThreePointArc((-3.911288501, 12.70531745), (-3.237253097, 11.766839243), (-3.898250872, 10.819133058))
            ThreePointArc((-3.898250872, 10.819133058), (-8.576111126, 7.661613273), (-11.188421808, 2.6588))
            ThreePointArc((-11.188421808, 2.6588), (-11.541328052, 2.10539819), (-12.161328052, 1.89))
        make_face(mode=Mode.SUBTRACT)
    extrude(amount=-MAIN_EXTRUSION_DEPTH)


solid = part.part
